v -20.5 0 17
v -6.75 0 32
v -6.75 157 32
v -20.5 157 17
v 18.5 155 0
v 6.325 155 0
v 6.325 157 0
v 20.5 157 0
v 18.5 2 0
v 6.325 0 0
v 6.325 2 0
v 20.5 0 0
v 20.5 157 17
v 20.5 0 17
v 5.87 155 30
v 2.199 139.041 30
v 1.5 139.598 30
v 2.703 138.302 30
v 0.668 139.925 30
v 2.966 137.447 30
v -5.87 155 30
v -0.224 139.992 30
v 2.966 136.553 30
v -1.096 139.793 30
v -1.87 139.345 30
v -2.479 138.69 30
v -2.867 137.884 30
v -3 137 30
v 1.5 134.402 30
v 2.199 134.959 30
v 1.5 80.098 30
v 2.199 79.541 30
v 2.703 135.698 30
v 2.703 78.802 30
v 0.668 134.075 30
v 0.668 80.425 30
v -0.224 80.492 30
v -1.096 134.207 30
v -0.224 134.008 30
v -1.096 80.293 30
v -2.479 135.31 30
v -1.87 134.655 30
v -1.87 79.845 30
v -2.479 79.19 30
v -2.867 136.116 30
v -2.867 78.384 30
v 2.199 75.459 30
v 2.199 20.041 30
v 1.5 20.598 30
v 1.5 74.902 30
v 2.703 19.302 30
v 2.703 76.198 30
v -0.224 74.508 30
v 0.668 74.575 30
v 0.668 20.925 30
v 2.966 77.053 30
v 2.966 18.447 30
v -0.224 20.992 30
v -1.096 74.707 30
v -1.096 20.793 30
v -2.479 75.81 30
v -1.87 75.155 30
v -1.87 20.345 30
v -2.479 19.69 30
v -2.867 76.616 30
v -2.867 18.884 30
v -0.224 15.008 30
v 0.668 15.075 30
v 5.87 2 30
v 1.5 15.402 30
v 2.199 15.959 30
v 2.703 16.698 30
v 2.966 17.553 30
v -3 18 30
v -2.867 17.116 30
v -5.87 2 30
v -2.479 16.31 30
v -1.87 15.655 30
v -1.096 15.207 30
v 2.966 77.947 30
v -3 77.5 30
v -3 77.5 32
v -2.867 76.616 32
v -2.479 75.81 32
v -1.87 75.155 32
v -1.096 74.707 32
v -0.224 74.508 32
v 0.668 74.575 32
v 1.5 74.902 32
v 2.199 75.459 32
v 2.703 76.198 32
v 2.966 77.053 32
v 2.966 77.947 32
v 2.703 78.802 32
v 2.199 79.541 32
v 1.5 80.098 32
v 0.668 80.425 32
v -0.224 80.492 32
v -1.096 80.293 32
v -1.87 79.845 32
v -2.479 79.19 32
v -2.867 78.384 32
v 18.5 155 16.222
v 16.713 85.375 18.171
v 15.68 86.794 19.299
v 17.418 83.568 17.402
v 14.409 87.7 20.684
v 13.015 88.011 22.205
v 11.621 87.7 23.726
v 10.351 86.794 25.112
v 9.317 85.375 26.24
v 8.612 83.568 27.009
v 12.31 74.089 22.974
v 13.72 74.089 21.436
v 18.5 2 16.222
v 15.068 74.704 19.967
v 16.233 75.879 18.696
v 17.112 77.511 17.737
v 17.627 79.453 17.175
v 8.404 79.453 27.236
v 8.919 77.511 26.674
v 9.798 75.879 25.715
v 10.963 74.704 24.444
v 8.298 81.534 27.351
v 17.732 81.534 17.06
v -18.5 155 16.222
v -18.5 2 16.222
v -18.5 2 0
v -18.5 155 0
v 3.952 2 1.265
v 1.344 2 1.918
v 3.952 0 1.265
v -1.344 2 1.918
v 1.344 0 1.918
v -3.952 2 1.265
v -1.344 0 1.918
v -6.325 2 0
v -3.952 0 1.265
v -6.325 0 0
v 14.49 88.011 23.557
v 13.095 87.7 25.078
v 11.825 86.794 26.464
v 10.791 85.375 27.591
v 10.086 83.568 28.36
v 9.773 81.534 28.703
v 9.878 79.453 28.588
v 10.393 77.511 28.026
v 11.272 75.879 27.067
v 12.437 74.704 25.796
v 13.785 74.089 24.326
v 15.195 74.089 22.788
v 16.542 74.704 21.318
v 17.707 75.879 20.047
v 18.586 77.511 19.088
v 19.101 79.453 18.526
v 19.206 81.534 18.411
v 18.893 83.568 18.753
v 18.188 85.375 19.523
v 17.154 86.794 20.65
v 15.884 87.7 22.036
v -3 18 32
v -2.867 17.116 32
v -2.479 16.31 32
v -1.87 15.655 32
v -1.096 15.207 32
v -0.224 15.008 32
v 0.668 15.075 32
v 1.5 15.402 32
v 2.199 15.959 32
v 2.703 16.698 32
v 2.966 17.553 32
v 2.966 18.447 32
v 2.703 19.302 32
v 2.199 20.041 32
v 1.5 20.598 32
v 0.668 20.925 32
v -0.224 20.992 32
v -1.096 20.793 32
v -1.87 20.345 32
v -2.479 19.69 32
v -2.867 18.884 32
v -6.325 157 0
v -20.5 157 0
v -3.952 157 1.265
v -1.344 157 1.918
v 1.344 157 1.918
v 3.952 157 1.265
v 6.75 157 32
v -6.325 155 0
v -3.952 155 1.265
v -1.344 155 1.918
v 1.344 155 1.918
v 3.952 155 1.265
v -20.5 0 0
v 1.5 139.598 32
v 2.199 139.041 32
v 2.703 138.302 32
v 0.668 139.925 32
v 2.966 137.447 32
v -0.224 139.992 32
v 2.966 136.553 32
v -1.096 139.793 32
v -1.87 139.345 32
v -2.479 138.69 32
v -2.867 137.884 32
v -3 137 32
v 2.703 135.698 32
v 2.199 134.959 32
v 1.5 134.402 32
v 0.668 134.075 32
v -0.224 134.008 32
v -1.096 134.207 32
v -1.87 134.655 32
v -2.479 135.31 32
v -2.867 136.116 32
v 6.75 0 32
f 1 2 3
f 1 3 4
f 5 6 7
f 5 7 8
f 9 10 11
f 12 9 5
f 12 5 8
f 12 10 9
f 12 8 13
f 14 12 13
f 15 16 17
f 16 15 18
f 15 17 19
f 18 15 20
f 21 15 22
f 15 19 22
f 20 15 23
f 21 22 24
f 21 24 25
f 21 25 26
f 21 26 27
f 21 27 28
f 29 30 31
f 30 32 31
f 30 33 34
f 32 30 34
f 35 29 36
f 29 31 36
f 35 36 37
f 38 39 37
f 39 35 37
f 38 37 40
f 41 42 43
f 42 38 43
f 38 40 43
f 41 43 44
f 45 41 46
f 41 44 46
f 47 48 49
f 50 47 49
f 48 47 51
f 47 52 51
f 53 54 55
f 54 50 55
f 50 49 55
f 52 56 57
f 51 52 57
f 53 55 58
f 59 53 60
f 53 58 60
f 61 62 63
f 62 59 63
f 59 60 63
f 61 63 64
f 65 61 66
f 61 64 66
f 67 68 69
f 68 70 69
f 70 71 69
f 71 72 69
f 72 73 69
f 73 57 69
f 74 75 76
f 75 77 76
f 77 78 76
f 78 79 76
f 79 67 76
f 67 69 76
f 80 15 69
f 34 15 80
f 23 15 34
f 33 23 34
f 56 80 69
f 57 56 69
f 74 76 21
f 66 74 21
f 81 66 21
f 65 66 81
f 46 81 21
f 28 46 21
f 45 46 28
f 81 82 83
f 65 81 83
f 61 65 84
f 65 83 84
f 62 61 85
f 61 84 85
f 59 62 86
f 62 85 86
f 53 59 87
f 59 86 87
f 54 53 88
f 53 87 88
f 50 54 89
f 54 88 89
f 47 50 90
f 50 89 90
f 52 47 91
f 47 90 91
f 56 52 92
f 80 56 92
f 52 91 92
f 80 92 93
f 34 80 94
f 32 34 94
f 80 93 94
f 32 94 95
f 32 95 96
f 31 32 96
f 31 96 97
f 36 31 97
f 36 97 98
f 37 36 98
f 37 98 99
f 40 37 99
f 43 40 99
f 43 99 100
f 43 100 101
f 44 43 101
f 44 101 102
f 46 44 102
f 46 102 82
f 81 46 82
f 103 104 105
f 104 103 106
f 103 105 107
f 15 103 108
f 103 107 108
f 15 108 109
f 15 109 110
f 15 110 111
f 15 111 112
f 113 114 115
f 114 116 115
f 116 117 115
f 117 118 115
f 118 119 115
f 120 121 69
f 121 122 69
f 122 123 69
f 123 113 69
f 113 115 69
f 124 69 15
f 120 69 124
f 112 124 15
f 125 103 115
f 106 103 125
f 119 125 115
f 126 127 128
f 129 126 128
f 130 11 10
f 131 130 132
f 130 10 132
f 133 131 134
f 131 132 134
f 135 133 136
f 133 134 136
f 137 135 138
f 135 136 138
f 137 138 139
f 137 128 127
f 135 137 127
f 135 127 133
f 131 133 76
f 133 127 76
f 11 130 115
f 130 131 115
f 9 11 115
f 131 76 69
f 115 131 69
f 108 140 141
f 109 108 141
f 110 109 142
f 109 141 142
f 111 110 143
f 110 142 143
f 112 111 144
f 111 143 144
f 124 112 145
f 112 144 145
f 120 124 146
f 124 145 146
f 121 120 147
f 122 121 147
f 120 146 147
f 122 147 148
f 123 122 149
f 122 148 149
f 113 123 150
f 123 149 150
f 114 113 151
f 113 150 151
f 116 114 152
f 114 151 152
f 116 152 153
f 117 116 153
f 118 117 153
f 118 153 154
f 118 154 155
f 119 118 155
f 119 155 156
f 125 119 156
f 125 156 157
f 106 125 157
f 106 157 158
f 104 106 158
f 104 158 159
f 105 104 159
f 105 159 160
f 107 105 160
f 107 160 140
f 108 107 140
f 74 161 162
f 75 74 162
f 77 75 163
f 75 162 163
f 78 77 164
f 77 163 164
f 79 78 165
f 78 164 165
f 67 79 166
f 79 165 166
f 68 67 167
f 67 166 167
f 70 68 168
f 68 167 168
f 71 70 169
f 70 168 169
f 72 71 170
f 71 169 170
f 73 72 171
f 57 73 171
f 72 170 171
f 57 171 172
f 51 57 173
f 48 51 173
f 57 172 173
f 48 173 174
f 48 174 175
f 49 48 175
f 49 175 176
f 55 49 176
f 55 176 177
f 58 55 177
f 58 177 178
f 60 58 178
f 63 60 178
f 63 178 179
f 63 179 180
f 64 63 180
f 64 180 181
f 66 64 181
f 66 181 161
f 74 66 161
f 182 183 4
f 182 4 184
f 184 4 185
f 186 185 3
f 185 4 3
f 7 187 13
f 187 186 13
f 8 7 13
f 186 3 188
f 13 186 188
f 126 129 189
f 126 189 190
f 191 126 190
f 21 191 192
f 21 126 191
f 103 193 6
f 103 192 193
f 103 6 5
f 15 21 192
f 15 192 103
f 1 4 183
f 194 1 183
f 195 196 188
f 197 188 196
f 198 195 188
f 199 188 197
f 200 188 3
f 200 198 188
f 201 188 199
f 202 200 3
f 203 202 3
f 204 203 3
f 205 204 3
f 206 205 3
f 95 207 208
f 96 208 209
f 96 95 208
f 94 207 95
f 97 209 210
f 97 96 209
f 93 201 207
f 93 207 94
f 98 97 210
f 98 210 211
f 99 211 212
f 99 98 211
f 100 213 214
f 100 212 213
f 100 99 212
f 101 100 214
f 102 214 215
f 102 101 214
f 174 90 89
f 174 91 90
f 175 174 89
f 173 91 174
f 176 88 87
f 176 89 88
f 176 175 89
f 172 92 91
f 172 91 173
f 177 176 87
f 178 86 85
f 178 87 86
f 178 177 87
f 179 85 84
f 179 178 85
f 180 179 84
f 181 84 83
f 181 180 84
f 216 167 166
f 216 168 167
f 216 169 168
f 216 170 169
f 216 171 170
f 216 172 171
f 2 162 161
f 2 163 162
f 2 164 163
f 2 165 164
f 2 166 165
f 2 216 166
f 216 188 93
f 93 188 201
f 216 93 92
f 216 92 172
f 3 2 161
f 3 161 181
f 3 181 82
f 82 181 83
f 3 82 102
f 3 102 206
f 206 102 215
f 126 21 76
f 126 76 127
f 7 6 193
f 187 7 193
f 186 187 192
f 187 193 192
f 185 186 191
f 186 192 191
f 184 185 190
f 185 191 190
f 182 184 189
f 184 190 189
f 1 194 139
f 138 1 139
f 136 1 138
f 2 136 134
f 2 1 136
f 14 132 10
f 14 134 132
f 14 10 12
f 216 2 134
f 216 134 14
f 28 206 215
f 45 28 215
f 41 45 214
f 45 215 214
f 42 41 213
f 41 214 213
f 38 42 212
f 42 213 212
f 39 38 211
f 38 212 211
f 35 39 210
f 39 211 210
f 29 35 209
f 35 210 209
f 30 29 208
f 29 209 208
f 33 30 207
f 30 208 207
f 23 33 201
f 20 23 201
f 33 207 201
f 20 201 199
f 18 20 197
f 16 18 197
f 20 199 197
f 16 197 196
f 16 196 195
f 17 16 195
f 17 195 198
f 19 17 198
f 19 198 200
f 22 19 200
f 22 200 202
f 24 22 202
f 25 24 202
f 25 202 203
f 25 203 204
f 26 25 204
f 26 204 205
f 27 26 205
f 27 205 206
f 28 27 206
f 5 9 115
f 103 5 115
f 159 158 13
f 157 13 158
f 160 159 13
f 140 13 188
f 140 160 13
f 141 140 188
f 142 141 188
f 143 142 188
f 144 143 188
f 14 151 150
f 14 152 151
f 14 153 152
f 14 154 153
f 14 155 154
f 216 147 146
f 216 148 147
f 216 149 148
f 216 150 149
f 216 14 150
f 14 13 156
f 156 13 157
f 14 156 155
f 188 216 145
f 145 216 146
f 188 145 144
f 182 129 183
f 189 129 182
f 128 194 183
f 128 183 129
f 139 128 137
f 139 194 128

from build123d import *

# Parameters (mm, degrees)
F1_DEPTH = 157
F2_T     = -2
F3_R     = 11
F4_DEPTH = 157
F6_D     = 6
F7_R     = 7
F8_DEPTH = 3


with BuildPart() as f1:
    # F0 (on Front) → F1 (new body)
    with BuildSketch(Plane.XZ):
        Polygon((-20.5, 17), (-20.5, 0), (0, 0), (20.5, 0), (20.5, 17), (6.75, 32), (0, 32), (-6.75, 32), align=None)
    extrude(amount=-F1_DEPTH)

    # F2
    f2_openings = [f1.faces().sort_by_distance(p)[0] for p in [
        (0, 78.5, 0),
    ]]
    offset(amount=F2_T, openings=f2_openings)

    # F3 (on Front) → F4 (cut)
    with BuildSketch(Plane.XZ):
        with Locations((0, -9)):
            Circle(F3_R)
    extrude(amount=-F4_DEPTH, mode=Mode.SUBTRACT)

    # F6 (through all)
    with Locations(Plane(origin=(0, 0, 30), x_dir=(1, 0, 0), z_dir=(0, 0, -1))):
        with Locations((0, -18), (0, -77.5), (0, -137)):
            Hole(F6_D / 2)

    # F7 (on face) → F8 (cut)
    with BuildSketch(Plane(origin=(19.6075471698, 0, 17.9735849057), x_dir=(0, 1, 0), z_dir=(0.7371541402, 0, 0.6757246285))):
        with Locations((81.0107703245, 7.5740857882)):
            Circle(F7_R)
    extrude(amount=-F8_DEPTH, mode=Mode.SUBTRACT)


solid = f1.part
